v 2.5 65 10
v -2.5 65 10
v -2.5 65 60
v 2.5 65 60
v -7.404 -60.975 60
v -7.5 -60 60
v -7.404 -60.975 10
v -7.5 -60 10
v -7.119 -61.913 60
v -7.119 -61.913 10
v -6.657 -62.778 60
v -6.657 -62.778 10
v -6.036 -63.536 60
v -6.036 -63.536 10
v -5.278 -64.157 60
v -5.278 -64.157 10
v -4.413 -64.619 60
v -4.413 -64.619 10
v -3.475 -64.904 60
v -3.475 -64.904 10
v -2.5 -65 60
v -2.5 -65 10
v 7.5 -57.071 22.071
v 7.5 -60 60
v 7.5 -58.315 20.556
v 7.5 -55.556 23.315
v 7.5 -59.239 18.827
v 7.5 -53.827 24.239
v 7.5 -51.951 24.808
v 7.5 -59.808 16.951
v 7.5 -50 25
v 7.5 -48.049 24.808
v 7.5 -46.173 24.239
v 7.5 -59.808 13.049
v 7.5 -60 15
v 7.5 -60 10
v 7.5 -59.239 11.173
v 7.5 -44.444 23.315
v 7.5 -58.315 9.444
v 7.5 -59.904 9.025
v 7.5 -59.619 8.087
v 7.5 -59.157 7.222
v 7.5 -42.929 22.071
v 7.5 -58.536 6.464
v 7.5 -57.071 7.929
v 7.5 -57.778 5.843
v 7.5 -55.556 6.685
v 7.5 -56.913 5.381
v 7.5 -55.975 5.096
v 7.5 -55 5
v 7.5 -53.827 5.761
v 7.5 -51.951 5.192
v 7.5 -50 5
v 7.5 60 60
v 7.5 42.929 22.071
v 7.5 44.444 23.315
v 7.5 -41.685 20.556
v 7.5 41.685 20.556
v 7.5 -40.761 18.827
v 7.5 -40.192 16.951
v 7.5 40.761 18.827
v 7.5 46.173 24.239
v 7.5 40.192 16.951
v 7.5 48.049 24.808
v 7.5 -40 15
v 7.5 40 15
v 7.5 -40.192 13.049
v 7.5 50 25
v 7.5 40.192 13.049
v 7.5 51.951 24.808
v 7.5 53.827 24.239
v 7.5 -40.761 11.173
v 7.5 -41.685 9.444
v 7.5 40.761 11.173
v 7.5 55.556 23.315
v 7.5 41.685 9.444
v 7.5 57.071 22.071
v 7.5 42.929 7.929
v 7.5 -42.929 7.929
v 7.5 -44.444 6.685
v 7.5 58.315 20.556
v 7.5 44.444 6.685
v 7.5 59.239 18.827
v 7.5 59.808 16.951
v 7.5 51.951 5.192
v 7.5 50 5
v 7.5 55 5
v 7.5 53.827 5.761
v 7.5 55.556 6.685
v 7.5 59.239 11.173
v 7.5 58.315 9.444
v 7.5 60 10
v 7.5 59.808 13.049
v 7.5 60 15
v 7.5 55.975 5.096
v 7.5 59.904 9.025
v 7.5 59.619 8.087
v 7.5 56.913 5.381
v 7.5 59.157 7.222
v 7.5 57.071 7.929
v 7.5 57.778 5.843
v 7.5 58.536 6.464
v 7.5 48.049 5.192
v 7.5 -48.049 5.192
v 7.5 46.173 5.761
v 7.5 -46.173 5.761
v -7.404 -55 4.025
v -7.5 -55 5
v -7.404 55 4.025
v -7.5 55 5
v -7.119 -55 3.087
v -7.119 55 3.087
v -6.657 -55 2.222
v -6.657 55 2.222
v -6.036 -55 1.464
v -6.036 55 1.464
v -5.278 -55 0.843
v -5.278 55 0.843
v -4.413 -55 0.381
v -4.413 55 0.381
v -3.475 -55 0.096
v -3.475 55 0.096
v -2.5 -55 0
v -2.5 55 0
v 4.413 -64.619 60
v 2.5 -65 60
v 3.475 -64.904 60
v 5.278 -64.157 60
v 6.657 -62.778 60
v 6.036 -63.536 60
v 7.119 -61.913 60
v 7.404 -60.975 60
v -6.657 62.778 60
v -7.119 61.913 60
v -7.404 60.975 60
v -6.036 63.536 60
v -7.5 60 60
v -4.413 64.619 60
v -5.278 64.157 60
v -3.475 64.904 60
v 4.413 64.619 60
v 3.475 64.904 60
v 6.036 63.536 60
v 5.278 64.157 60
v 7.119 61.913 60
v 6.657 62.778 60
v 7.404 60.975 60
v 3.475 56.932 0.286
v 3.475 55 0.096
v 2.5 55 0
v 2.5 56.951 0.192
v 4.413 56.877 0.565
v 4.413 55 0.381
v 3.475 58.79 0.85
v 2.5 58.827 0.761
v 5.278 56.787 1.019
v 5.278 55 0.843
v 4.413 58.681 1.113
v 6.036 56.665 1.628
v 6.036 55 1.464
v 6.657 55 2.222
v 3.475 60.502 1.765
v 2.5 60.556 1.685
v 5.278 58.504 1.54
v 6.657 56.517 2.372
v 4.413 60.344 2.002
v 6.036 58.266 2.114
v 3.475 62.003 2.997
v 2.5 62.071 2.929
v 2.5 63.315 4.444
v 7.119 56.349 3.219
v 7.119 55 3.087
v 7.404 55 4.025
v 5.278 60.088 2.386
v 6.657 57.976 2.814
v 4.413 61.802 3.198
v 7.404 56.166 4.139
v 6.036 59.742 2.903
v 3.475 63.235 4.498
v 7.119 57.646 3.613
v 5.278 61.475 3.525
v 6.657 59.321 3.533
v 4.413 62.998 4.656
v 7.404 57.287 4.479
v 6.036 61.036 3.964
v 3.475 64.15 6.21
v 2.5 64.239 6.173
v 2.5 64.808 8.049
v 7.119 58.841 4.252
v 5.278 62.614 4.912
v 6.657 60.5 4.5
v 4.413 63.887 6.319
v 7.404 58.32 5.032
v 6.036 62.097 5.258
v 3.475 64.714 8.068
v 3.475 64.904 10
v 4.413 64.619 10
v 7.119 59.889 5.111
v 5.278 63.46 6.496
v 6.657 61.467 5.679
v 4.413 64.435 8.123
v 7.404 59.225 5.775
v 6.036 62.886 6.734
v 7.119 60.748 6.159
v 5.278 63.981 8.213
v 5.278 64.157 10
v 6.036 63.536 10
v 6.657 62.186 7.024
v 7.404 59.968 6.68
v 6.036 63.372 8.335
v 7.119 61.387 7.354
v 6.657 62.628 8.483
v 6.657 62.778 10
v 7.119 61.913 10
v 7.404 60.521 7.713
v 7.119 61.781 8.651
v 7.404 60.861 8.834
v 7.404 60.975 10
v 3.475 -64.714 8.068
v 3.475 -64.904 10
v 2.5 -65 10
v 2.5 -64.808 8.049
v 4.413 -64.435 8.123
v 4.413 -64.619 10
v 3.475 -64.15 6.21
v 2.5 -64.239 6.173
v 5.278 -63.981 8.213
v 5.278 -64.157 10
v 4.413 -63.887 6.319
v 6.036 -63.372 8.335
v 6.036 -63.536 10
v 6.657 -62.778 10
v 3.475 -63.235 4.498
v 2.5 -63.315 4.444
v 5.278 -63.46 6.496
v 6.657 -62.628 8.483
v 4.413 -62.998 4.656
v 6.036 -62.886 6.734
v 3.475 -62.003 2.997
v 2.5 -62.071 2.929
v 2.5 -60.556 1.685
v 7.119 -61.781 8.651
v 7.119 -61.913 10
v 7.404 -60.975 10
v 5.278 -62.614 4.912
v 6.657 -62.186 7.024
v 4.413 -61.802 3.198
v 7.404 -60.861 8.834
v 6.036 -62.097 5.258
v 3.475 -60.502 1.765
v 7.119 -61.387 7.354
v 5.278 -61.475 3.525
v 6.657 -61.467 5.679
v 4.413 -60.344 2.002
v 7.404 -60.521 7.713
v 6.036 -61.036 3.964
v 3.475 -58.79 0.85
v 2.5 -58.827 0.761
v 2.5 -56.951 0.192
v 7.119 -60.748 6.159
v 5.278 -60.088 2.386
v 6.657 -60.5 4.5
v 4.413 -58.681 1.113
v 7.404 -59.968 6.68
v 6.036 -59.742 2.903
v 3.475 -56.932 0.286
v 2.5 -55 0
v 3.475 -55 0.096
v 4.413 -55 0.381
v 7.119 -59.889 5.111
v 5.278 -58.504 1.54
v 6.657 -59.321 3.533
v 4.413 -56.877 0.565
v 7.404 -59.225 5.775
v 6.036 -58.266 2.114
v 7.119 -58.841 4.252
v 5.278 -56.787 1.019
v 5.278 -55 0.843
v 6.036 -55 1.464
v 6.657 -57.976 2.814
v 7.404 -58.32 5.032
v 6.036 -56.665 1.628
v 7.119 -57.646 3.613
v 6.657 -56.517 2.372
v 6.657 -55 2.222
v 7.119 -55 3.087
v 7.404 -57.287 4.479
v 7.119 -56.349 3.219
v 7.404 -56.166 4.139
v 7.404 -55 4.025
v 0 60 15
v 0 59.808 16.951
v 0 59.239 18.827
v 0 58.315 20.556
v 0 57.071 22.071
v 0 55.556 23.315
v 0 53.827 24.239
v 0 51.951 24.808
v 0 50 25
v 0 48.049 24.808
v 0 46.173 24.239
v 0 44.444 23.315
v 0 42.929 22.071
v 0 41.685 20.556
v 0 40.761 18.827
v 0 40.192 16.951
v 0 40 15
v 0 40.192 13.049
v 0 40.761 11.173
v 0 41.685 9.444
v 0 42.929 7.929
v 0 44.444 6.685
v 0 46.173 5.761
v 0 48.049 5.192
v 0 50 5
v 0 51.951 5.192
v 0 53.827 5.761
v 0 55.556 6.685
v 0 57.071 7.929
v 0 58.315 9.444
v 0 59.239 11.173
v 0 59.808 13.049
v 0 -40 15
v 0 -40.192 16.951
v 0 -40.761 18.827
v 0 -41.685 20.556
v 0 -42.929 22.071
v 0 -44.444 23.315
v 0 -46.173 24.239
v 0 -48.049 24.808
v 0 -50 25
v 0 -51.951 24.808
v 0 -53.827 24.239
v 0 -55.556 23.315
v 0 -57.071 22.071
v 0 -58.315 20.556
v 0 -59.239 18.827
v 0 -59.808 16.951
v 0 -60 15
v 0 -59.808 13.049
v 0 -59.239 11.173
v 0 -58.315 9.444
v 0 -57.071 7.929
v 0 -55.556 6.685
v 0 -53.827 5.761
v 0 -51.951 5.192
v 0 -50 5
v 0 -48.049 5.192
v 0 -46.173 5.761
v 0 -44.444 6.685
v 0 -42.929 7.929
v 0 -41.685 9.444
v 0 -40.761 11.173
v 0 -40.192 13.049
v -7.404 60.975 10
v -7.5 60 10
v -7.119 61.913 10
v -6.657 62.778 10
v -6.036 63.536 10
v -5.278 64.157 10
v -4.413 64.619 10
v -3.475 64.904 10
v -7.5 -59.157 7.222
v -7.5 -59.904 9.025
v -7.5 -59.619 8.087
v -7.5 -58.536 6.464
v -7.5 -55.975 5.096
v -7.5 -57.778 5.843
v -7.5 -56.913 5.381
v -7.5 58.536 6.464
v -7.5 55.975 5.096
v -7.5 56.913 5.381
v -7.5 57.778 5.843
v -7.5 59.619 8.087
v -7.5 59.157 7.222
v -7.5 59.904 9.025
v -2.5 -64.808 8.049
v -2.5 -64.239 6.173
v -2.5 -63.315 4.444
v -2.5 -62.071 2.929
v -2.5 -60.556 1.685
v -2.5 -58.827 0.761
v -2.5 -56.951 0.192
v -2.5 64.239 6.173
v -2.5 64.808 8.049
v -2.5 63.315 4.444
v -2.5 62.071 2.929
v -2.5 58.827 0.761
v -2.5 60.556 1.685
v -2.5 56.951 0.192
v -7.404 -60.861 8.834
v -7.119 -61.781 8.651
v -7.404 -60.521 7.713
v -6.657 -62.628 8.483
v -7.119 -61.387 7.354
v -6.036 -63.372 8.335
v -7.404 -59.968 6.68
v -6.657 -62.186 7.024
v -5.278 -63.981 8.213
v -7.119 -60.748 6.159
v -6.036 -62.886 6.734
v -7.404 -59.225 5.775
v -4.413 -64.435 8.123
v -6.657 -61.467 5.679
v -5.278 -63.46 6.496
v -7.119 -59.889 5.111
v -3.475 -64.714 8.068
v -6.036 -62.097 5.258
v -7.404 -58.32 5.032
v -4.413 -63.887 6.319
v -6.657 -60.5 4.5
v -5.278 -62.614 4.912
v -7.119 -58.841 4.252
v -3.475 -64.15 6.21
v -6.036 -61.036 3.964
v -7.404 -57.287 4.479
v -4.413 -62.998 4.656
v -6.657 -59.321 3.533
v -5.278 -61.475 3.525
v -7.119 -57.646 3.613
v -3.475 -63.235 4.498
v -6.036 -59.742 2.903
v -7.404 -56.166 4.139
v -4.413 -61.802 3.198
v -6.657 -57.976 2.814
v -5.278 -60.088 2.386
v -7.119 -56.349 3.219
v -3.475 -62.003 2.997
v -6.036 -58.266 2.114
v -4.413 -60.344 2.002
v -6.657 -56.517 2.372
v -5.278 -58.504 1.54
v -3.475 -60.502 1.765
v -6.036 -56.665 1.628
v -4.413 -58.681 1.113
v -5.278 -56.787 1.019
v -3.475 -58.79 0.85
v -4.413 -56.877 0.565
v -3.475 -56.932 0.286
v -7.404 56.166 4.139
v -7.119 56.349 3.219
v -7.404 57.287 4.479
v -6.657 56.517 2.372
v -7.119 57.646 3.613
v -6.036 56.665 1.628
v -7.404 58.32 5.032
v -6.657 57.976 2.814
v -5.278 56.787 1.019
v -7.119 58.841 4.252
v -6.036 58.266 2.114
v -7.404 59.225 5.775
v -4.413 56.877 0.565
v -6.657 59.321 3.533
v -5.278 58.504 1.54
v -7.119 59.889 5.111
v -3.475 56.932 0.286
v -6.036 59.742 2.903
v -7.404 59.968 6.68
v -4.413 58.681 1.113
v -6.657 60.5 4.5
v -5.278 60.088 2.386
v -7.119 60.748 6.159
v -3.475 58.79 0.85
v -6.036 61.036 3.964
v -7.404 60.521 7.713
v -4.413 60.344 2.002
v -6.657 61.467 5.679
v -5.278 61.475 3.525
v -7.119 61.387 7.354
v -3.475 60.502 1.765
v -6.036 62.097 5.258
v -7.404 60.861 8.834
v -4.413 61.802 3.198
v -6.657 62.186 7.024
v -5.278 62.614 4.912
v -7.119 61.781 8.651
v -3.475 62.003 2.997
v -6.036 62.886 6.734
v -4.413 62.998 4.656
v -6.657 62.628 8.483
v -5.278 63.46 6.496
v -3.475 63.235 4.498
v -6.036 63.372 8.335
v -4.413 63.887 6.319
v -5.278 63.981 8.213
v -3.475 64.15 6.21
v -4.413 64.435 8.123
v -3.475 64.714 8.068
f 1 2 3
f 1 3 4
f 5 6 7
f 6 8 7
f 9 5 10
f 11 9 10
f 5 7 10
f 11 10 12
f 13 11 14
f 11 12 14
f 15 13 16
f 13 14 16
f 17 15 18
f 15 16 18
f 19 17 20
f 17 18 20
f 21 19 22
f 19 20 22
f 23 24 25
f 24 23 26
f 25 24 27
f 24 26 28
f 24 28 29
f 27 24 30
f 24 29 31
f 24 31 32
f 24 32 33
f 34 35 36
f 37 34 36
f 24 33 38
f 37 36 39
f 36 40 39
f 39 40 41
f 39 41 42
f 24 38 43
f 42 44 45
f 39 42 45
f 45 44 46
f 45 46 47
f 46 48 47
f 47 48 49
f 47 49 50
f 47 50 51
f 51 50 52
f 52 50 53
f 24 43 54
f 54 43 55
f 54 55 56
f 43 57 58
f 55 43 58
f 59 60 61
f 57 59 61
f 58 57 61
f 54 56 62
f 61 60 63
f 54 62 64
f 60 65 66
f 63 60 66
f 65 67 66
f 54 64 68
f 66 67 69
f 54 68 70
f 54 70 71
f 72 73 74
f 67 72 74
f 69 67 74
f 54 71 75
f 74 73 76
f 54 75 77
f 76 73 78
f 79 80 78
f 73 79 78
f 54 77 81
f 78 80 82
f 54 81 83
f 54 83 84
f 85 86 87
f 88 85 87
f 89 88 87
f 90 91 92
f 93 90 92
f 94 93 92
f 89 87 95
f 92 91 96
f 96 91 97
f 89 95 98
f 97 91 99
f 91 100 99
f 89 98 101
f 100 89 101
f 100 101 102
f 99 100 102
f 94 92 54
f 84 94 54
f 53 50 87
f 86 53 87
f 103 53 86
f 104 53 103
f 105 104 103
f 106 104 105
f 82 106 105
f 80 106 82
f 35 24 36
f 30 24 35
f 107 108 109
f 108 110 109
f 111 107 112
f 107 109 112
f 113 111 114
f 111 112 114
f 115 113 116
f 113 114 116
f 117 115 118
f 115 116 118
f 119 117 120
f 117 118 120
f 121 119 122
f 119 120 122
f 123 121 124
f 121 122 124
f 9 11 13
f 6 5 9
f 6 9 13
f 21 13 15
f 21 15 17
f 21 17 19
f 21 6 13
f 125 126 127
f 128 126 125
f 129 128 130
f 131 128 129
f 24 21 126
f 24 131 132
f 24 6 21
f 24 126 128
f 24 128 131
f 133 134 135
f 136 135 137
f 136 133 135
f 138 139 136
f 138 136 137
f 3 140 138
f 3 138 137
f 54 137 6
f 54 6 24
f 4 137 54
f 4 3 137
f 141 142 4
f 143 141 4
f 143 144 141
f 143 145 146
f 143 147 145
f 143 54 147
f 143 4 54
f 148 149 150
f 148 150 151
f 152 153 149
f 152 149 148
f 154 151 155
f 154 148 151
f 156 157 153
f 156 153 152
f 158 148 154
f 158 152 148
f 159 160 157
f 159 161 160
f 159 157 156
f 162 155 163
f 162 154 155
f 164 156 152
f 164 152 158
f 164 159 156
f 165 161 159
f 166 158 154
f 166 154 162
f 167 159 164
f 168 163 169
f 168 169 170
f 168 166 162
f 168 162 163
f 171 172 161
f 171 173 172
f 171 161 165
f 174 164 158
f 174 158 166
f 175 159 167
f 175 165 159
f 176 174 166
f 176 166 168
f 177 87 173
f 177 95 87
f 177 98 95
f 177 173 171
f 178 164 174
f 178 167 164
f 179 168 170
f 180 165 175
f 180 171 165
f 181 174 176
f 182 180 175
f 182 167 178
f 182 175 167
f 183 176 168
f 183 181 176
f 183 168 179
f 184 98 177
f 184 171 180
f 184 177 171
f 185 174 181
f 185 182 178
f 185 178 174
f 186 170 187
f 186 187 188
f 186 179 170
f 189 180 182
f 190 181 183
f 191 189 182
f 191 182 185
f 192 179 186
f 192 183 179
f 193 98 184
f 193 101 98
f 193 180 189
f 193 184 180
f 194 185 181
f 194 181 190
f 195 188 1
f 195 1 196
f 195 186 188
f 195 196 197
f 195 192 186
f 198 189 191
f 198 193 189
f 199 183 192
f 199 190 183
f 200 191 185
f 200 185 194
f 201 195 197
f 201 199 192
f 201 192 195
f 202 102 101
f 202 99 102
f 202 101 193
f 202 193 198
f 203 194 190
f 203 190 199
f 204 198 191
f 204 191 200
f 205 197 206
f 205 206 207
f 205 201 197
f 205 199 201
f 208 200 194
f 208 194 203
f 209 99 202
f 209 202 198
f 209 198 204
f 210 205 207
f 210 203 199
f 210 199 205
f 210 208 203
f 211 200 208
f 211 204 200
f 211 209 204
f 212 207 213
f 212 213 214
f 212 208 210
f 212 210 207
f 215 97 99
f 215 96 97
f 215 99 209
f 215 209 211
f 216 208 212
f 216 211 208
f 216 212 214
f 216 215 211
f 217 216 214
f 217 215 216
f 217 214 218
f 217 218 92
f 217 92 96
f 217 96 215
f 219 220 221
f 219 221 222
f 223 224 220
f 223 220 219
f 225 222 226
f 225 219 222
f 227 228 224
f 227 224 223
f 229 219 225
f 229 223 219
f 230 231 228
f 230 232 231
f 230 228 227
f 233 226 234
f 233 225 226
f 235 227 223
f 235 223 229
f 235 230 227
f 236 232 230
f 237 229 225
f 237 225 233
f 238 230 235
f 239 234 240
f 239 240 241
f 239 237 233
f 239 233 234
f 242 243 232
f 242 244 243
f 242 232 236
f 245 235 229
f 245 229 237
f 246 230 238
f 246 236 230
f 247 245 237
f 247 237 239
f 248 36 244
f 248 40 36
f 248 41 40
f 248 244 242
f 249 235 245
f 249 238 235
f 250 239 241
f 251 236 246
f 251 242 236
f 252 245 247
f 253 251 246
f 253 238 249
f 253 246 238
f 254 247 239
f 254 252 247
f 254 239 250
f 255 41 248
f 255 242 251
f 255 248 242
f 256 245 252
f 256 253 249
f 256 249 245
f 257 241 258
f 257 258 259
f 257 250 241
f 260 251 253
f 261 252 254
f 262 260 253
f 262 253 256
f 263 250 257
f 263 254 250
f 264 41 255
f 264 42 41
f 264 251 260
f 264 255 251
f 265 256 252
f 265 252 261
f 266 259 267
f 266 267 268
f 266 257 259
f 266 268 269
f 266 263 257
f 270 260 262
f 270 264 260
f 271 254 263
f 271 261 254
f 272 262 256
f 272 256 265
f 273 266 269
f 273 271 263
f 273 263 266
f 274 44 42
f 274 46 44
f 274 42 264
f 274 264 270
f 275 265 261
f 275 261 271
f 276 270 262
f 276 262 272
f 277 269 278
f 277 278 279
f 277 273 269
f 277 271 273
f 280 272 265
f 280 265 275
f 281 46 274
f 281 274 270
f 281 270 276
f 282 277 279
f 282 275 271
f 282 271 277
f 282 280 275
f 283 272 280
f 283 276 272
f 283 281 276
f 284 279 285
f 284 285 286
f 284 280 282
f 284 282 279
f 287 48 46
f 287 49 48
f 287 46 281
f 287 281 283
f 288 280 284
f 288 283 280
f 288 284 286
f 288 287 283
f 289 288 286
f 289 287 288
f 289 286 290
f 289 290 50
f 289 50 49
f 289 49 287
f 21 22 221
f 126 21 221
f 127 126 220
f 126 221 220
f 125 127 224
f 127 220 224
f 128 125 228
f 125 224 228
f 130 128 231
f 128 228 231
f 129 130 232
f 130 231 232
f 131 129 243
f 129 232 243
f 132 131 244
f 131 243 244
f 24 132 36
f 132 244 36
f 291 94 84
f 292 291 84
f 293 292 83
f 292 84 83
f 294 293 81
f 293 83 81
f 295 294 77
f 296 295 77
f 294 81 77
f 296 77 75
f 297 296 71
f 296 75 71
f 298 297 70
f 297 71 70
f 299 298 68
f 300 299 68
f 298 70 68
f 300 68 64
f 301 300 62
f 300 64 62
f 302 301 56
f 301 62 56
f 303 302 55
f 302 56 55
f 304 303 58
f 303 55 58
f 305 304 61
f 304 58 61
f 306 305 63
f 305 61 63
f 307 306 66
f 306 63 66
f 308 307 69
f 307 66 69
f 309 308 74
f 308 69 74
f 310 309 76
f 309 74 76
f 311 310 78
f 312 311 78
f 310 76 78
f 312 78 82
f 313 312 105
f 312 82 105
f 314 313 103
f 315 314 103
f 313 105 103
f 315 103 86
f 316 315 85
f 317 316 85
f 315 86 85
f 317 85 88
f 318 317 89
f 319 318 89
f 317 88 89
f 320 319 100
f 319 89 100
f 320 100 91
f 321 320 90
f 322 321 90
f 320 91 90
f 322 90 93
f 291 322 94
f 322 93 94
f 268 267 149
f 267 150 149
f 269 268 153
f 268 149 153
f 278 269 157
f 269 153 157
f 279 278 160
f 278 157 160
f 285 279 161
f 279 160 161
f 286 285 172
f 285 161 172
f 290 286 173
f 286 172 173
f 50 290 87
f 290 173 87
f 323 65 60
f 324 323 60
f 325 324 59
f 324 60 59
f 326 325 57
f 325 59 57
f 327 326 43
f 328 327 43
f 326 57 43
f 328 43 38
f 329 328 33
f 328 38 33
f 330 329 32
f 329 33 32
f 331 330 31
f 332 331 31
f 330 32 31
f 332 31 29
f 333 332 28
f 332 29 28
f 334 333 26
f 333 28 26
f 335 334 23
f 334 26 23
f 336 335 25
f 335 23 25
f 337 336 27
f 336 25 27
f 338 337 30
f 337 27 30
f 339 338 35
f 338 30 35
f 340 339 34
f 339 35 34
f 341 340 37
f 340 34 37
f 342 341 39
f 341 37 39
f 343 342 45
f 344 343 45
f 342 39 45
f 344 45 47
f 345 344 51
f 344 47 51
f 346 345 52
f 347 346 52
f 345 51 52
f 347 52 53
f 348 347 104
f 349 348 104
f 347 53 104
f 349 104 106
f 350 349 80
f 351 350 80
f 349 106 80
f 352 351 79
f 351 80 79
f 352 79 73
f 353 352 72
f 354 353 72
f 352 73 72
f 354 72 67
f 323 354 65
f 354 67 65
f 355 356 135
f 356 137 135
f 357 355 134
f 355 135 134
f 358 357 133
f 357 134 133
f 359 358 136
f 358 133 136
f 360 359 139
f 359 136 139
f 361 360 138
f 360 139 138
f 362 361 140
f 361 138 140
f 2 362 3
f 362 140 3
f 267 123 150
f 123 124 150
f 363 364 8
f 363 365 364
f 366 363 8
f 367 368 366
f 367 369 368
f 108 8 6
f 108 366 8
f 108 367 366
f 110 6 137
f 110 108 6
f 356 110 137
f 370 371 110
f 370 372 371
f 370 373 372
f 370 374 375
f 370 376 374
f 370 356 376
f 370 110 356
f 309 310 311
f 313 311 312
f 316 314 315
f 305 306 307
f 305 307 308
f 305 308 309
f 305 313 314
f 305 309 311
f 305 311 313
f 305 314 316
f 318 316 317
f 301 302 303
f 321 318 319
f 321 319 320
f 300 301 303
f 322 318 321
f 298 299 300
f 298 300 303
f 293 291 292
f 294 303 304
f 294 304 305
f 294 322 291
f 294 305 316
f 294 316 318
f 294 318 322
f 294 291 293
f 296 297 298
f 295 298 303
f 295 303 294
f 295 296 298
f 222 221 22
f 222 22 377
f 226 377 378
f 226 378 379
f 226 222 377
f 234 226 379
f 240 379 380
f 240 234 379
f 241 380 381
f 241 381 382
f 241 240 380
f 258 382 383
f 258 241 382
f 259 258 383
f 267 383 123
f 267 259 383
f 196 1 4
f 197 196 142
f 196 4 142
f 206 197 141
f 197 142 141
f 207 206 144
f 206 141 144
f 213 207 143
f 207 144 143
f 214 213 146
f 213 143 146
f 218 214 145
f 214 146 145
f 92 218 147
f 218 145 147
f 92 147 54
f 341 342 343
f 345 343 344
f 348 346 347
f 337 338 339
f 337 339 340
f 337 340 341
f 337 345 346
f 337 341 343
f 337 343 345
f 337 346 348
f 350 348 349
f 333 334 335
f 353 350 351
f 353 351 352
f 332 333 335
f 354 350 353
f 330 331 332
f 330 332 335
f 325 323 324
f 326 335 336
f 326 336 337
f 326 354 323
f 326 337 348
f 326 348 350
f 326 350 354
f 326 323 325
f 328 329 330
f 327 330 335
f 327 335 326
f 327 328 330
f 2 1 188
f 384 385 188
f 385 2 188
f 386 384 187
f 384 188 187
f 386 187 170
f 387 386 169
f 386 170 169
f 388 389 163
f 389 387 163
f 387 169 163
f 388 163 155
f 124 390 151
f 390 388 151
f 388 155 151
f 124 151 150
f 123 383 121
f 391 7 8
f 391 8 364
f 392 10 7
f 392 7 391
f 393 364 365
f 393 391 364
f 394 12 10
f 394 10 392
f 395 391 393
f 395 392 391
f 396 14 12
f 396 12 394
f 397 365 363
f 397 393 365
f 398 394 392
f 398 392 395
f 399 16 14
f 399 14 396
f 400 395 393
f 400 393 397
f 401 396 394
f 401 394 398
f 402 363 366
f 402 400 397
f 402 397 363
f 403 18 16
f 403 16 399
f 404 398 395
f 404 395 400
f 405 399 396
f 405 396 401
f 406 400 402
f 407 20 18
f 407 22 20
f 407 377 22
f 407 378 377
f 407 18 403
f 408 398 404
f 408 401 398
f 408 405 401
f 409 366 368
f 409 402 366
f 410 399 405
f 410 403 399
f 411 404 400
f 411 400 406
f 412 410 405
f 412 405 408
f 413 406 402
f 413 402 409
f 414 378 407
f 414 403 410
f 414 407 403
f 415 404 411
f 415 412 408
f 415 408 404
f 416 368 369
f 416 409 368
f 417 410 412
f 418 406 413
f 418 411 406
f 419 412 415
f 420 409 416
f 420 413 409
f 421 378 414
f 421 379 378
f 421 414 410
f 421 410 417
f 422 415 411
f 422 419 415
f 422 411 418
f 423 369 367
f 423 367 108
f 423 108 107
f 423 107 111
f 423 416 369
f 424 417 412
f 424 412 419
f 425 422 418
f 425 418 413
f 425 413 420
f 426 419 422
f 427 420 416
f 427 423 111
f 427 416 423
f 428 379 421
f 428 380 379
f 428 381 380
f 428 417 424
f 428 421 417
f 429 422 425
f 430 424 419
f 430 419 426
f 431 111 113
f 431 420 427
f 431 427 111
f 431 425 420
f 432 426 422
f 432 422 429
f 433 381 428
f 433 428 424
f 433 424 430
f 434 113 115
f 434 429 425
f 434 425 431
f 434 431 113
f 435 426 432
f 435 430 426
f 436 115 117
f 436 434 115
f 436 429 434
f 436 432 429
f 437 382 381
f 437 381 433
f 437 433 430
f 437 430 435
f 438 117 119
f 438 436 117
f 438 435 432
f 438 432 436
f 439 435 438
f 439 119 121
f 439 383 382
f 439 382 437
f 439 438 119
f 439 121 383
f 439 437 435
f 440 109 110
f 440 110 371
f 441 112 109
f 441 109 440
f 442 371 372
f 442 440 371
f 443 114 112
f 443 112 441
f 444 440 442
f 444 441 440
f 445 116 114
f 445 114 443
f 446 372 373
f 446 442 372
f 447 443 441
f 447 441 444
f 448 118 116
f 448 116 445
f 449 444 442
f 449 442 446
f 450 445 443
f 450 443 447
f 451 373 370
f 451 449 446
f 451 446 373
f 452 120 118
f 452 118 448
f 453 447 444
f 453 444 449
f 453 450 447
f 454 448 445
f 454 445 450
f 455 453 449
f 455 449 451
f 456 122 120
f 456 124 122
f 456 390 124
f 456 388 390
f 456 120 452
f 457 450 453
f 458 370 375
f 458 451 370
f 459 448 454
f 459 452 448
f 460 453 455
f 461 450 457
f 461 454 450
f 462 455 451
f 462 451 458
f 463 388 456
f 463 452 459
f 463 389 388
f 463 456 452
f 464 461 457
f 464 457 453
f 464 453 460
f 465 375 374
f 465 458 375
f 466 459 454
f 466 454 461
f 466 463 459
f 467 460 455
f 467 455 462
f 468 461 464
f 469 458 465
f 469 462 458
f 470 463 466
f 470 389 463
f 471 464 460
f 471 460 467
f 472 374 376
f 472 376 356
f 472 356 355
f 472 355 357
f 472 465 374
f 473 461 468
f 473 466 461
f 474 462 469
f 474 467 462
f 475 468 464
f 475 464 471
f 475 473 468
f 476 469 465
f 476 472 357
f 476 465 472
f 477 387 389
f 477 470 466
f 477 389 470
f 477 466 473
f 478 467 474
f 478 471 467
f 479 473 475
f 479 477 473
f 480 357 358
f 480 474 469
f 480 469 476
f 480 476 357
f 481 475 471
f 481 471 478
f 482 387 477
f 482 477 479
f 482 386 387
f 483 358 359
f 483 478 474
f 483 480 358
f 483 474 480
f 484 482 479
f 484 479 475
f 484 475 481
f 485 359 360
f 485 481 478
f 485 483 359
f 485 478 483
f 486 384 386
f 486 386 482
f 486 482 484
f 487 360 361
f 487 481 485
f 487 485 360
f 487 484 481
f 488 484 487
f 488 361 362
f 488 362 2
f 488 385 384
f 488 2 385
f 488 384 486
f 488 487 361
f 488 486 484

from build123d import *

# Parameters (mm, degrees)
F0_W     = 15
F0_H     = 130
F1_DEPTH = 60
F2_R     = 10
F3_DEPTH = 7.5
F4_R     = 10
F5_R     = 4.99999


# Not quite as in the source:
# - a fillet or chamfer is up to 0.001 mm smaller than in the source, because OpenCascade refuses the exact size


with BuildPart() as f1:
    # F0 (on Top) → F1 (new body)
    with BuildSketch(Plane.XY):
        Rectangle(F0_W, F0_H)
    extrude(amount=F1_DEPTH)

    # F2 (on face) → F3 (cut)
    with BuildSketch(Plane.YZ.offset(7.5)):
        with Locations((-50, 15)):
            Circle(F2_R)
        with Locations((50, 15)):
            Circle(F2_R)
    extrude(amount=-F3_DEPTH, mode=Mode.SUBTRACT)

    # F4
    f4_edges = [f1.edges().sort_by_distance(p)[0] for p in [
        (0, -65, 0),
        (0, 65, 0),
    ]]
    fillet(f4_edges, radius=F4_R)

    # F5 (radius 5 in the source; OpenCascade refuses exactly that, so slightly less here)
    f5_edges = [f1.edges().sort_by_distance(p)[0] for p in [
        (7.5, 0, 0),
        (-7.5, 0, 0),
    ]]
    fillet(f5_edges, radius=F5_R)


solid = f1.part
